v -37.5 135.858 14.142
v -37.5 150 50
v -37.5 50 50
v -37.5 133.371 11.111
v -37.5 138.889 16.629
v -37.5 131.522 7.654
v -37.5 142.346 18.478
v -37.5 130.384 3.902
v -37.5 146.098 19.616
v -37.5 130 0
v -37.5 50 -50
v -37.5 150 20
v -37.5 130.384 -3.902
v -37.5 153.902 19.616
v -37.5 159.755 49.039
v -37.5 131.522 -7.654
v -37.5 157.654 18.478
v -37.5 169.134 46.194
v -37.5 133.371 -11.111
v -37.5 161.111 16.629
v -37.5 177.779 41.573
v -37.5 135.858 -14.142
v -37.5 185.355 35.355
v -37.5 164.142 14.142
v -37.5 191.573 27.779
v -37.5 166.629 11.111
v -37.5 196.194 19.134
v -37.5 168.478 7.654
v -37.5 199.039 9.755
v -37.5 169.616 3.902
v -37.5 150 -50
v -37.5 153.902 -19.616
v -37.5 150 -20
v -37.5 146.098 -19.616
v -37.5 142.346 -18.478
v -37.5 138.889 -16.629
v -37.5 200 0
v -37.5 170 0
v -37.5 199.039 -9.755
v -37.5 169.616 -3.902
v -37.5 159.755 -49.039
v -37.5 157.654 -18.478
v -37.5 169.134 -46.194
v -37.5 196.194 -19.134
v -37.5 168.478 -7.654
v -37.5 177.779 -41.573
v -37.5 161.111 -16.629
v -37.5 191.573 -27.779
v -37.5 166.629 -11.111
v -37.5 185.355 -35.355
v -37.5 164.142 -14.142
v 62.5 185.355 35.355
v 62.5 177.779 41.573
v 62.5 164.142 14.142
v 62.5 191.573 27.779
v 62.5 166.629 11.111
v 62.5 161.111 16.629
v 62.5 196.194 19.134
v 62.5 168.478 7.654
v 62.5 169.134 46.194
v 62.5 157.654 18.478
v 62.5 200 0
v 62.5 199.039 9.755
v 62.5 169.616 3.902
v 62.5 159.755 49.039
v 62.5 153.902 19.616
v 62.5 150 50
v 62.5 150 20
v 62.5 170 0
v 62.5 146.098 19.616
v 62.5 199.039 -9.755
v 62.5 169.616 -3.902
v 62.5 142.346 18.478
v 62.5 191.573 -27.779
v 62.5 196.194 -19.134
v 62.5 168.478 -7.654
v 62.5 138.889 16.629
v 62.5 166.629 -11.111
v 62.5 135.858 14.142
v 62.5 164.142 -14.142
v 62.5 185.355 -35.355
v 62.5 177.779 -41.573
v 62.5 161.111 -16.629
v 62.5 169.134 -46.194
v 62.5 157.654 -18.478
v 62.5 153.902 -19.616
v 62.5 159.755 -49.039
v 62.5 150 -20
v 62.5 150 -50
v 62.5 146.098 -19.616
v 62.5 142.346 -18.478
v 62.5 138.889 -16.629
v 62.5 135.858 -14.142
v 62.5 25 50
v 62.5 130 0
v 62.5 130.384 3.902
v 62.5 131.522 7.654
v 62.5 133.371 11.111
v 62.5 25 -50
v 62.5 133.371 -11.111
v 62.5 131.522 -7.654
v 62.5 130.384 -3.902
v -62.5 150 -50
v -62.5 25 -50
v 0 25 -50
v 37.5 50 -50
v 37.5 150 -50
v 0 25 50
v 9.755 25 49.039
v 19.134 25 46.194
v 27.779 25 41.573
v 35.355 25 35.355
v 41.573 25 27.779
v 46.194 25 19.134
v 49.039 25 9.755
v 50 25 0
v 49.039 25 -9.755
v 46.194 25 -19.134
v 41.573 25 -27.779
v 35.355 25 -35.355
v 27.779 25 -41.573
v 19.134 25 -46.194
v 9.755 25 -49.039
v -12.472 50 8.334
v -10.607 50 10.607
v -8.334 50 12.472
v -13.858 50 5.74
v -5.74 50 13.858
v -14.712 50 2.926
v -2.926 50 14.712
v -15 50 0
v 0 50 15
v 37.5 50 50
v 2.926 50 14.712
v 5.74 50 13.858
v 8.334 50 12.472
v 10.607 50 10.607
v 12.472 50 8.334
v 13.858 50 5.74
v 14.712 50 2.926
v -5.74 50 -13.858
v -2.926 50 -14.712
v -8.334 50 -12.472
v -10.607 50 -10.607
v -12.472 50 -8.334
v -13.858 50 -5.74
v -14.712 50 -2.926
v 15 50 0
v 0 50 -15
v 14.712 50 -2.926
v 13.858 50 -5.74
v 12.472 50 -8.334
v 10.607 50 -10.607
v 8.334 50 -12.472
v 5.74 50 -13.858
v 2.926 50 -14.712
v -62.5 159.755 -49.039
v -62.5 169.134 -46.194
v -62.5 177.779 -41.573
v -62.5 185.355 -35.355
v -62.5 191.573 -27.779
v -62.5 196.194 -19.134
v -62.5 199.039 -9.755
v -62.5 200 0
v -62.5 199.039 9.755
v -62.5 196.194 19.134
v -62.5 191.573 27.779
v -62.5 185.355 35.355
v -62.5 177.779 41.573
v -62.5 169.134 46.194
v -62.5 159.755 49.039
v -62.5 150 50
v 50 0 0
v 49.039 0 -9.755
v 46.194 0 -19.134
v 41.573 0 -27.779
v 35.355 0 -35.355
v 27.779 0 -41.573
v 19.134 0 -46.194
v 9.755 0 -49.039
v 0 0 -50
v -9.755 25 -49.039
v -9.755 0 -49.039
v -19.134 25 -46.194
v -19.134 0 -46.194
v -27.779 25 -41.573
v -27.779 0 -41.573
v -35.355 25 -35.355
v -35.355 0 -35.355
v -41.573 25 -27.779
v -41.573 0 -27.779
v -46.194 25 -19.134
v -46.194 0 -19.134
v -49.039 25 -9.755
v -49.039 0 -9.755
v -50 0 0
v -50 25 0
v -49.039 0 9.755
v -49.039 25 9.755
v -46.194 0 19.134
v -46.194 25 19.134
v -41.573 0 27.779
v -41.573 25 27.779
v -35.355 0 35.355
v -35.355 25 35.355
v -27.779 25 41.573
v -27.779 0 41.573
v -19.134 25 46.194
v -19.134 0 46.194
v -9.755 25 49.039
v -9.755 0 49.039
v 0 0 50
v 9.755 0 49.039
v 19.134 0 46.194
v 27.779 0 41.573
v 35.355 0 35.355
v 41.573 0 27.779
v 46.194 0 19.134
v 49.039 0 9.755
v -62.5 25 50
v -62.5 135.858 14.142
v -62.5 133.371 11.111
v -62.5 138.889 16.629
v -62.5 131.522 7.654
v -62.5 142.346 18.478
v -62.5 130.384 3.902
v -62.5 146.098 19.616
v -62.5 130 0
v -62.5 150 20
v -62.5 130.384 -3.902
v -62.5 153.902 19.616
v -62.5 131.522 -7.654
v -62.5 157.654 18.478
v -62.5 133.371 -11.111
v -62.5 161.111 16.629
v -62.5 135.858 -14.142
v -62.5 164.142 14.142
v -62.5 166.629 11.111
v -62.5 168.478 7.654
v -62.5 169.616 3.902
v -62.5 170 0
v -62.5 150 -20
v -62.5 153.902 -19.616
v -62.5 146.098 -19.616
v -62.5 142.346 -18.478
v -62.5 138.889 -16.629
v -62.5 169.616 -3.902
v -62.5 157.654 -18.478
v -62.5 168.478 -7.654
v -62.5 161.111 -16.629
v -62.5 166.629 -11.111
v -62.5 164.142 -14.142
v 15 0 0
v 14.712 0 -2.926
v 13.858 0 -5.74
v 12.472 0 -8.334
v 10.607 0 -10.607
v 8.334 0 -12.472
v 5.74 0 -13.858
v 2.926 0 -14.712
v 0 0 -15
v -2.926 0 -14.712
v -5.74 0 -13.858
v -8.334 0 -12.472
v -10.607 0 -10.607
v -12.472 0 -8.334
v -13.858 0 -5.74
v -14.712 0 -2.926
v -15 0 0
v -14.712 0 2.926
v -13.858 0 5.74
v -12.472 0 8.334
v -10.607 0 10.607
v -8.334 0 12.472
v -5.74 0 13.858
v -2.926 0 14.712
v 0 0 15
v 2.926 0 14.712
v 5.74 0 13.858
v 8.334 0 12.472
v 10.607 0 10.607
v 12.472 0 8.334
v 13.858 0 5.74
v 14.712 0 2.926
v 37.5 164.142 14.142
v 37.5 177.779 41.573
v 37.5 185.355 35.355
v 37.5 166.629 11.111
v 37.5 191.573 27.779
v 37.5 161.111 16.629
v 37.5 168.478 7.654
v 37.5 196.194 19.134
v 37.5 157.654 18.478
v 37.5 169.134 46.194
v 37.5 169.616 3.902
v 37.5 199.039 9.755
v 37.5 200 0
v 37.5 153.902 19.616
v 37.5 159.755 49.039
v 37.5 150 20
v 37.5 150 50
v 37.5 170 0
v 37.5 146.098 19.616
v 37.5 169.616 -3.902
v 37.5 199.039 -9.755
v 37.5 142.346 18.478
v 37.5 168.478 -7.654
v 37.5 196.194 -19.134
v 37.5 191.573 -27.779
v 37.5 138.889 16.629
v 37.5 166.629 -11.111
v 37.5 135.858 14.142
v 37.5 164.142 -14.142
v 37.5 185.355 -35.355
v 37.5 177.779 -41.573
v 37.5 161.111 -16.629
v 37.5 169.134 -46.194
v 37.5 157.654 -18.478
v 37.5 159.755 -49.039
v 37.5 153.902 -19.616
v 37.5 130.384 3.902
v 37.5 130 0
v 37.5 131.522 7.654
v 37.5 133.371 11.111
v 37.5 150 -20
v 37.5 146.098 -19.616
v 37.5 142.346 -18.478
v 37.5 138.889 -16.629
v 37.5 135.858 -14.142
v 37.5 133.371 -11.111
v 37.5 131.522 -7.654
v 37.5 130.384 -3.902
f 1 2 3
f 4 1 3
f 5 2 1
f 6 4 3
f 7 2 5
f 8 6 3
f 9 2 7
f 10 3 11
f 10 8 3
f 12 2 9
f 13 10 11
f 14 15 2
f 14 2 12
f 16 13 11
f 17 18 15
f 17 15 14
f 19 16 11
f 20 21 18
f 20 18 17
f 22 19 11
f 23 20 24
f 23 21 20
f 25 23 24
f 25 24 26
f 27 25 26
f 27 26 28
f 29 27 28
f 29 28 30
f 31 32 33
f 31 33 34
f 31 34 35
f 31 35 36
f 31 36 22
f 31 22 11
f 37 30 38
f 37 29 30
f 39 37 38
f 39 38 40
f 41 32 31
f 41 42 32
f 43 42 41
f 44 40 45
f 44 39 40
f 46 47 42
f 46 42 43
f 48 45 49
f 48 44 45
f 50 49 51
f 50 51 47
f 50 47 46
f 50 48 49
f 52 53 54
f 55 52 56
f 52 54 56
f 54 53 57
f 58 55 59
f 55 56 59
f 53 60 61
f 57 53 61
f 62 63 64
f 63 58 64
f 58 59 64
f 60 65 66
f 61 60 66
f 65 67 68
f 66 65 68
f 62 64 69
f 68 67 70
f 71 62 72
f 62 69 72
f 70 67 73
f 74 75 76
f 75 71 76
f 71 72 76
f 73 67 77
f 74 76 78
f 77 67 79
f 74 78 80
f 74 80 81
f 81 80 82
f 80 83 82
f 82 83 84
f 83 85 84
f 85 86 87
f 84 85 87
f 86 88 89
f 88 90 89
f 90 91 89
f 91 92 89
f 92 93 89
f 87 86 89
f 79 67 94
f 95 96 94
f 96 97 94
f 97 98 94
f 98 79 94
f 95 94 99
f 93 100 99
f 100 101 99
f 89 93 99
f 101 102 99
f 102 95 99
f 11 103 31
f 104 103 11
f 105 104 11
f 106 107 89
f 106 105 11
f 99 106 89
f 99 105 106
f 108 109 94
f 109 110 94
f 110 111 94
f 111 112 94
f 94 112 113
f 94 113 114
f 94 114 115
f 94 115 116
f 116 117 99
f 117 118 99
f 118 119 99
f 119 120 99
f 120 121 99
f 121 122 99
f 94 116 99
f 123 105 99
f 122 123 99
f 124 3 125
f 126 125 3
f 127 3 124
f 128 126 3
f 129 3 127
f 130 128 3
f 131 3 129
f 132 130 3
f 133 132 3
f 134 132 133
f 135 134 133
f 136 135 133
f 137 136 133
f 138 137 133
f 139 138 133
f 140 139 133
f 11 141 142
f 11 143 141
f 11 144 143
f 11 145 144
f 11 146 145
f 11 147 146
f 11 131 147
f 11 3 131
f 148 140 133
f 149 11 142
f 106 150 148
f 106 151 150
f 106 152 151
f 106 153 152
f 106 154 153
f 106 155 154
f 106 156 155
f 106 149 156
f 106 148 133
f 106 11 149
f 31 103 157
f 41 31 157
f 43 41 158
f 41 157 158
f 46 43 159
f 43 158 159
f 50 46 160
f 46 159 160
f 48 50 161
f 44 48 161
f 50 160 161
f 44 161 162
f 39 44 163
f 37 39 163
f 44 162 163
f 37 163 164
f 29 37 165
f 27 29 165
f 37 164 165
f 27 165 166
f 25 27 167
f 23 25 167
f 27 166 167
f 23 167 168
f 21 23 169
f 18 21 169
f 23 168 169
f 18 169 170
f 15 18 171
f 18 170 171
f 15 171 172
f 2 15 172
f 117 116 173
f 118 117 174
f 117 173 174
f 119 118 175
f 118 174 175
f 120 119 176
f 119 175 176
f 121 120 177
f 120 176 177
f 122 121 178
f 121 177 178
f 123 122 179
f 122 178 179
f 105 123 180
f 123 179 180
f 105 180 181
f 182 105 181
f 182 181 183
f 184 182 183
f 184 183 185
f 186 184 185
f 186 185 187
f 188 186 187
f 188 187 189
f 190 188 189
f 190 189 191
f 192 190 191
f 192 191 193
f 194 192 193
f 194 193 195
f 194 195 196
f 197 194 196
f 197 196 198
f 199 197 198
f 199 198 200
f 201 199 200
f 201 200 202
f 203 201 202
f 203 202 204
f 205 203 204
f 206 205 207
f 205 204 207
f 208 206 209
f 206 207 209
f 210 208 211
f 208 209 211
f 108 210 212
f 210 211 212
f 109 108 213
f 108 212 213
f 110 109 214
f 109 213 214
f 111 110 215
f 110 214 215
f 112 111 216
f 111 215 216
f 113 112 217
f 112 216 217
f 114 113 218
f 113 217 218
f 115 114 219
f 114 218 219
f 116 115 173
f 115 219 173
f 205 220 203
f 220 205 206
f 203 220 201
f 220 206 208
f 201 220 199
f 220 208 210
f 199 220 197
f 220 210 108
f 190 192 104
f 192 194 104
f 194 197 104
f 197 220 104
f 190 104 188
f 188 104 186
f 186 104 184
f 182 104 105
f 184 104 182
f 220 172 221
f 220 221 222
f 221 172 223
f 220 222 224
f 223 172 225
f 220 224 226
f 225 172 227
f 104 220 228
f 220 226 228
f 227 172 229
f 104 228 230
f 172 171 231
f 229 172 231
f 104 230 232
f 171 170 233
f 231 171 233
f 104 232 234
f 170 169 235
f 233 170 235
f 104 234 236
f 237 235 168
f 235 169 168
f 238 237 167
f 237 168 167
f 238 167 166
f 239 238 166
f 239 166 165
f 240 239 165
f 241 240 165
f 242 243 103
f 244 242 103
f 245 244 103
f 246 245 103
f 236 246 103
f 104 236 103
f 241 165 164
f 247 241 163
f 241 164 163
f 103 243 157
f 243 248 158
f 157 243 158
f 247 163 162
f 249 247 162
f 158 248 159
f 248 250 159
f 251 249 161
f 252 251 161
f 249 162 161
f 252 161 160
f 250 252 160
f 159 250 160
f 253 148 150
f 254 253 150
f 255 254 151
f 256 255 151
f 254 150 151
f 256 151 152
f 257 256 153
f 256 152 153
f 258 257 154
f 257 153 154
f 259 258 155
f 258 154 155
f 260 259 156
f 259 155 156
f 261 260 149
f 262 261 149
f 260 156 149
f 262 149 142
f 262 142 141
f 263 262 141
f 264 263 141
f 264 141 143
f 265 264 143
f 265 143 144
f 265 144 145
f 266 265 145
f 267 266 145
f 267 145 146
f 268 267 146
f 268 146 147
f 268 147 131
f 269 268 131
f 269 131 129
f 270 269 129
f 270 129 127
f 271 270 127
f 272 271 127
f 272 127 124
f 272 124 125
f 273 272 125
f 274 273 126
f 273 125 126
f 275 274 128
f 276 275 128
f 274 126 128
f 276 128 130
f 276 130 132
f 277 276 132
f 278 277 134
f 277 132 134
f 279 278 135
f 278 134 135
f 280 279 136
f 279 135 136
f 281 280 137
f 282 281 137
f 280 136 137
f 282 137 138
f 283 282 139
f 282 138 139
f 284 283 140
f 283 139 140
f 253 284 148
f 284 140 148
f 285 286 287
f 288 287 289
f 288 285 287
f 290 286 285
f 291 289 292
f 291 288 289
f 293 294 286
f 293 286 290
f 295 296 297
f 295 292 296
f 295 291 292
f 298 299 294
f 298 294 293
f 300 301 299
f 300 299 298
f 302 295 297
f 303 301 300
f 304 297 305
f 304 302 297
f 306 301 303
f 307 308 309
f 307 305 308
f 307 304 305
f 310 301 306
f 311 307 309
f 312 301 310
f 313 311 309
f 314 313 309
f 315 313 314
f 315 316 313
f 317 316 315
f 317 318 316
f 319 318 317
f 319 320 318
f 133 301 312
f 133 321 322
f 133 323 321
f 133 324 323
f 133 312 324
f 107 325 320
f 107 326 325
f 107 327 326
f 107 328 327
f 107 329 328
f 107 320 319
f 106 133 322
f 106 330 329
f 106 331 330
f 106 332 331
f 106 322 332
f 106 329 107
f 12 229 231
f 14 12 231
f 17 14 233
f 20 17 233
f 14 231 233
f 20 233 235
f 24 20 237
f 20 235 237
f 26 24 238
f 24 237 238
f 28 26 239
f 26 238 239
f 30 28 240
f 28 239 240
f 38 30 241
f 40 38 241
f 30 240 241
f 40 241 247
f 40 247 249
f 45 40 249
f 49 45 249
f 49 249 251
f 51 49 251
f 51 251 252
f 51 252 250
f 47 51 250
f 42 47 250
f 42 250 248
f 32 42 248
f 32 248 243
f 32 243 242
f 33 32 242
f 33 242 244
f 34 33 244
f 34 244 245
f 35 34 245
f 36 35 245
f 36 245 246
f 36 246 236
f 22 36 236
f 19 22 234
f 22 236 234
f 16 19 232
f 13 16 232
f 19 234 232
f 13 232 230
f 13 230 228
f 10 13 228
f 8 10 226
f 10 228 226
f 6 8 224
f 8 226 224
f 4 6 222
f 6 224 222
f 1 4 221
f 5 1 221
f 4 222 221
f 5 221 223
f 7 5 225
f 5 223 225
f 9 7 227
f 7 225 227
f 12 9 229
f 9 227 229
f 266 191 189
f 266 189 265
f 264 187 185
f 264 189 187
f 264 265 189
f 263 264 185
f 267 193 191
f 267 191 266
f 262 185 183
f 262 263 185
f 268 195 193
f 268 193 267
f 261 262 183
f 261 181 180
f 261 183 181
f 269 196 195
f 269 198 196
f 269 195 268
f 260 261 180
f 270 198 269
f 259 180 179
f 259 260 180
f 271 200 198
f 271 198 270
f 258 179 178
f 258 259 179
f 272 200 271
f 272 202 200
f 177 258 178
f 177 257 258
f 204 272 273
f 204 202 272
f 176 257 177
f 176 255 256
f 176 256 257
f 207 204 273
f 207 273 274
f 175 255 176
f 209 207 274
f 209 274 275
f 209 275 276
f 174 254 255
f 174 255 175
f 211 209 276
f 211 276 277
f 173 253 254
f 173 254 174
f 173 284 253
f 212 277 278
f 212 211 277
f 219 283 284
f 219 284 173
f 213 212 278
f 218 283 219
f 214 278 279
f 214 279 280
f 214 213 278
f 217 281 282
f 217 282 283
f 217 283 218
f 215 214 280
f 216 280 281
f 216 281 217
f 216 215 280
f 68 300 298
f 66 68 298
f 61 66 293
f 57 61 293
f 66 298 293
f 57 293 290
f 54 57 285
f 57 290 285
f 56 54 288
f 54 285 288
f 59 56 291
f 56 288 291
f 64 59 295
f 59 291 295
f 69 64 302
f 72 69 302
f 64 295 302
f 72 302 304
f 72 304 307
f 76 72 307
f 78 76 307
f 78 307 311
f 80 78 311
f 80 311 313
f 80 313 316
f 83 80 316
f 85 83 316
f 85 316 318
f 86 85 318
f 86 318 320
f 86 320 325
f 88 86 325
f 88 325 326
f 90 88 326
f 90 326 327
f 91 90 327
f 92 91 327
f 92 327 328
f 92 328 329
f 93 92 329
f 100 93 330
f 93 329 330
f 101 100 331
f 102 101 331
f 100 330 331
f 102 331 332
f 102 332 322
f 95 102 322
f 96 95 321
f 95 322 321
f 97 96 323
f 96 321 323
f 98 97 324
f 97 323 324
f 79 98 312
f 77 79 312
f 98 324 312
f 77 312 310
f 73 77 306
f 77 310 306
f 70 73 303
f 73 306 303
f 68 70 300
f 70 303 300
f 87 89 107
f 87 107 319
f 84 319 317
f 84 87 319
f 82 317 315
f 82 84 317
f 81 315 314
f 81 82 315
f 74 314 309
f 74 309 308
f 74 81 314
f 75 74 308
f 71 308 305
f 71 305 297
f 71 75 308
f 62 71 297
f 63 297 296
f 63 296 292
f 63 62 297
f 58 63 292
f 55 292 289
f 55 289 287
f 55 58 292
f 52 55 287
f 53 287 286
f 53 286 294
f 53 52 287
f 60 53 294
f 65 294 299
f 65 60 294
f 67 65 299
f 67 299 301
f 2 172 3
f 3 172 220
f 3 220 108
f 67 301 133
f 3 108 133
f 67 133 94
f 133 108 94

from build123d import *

# Parameters (mm, degrees)
SKETCH1_R               = 50
SKETCH1_R_2             = 37.5
BOSS_EXTRUDE3_DEPTH     = 25
SKETCH2_R               = 37.5
BOSS_EXTRUDE4_DEPTH     = 25
SKETCH3_W               = 125
SKETCH3_H               = 100
BOSS_EXTRUDE5_DEPTH     = 25
SKETCH4_W               = 25
SKETCH4_H               = 100
BOSS_EXTRUDE6_DEPTH     = 100
SKETCH5_W               = 25
SKETCH5_H               = 100
BOSS_EXTRUDE7_DEPTH     = 100
SKETCH7_R               = 15
CUT_EXTRUDE1_DEPTH      = 101
CUT_EXTRUDE1_DEPTH_BACK = 51
BOSS_EXTRUDE12_DEPTH    = 25
BOSS_EXTRUDE13_DEPTH    = 25
SKETCH14_R              = 20
CUT_EXTRUDE2_DEPTH      = 1
CUT_EXTRUDE2_DEPTH_BACK = 126


with BuildPart() as part:
    # Sketch1 → Boss-Extrude3 (new body)
    with BuildSketch(Plane(origin=(0, 0, 0), x_dir=(1, 0, 0), z_dir=(0, 1, 0))):
        Circle(SKETCH1_R)
        Circle(SKETCH1_R_2, mode=Mode.SUBTRACT)
    extrude(amount=BOSS_EXTRUDE3_DEPTH)

    # Sketch2 → Boss-Extrude4 (add)
    with BuildSketch(Plane.XZ):
        Circle(SKETCH2_R)
    extrude(amount=-BOSS_EXTRUDE4_DEPTH)

    # Sketch3 → Boss-Extrude5 (add)
    with BuildSketch(Plane(origin=(0, 25, 0), x_dir=(1, 0, 0), z_dir=(0, 1, 0))):
        Rectangle(SKETCH3_W, SKETCH3_H)
    extrude(amount=BOSS_EXTRUDE5_DEPTH)

    # Sketch4 → Boss-Extrude6 (add)
    with BuildSketch(Plane(origin=(0, 50, 0), x_dir=(1, 0, 0), z_dir=(0, 1, 0))):
        with Locations((-50, 0)):
            Rectangle(SKETCH4_W, SKETCH4_H)
    extrude(amount=BOSS_EXTRUDE6_DEPTH)

    # Sketch5 → Boss-Extrude7 (add)
    with BuildSketch(Plane(origin=(0, 50, 0), x_dir=(1, 0, 0), z_dir=(0, 1, 0))):
        with Locations((50, 0)):
            Rectangle(SKETCH5_W, SKETCH5_H)
    extrude(amount=BOSS_EXTRUDE7_DEPTH)

    # Sketch7 → Cut-Extrude1 (cut, two sides)
    with BuildSketch(Plane(origin=(0, 50, 0), x_dir=(1, 0, 0), z_dir=(0, 1, 0))) as cut_extrude1_sk:
        Circle(SKETCH7_R)
    extrude(amount=CUT_EXTRUDE1_DEPTH, mode=Mode.SUBTRACT)
    extrude(cut_extrude1_sk.sketch, amount=-CUT_EXTRUDE1_DEPTH_BACK, mode=Mode.SUBTRACT)

    # Sketch11 → Boss-Extrude12 (add)
    with BuildSketch(Plane(origin=(62.5, 0, 0), x_dir=(0, 0, -1), z_dir=(1, 0, 0))):
        with BuildLine():
            Line((-50, 25), (50, 25))
            Line((50, 25), (50, 150))
            ThreePointArc((50, 150), (0, 200), (-50, 150))
            Line((-50, 150), (-50, 25))
        make_face()
    extrude(amount=-BOSS_EXTRUDE12_DEPTH)

    # Sketch13 → Boss-Extrude13 (add)
    with BuildSketch(Plane.ZY.offset(62.5)):
        with BuildLine():
            Line((50, 150), (-50, 150))
            ThreePointArc((-50, 150), (0, 200), (50, 150))
        make_face()
    extrude(amount=-BOSS_EXTRUDE13_DEPTH)

    # Sketch14 → Cut-Extrude2 (cut, two sides)
    with BuildSketch(Plane.ZY.offset(62.5)) as cut_extrude2_sk:
        with Locations((0, 150)):
            Circle(SKETCH14_R)
    extrude(amount=CUT_EXTRUDE2_DEPTH, mode=Mode.SUBTRACT)
    extrude(cut_extrude2_sk.sketch, amount=-CUT_EXTRUDE2_DEPTH_BACK, mode=Mode.SUBTRACT)


solid = part.part
